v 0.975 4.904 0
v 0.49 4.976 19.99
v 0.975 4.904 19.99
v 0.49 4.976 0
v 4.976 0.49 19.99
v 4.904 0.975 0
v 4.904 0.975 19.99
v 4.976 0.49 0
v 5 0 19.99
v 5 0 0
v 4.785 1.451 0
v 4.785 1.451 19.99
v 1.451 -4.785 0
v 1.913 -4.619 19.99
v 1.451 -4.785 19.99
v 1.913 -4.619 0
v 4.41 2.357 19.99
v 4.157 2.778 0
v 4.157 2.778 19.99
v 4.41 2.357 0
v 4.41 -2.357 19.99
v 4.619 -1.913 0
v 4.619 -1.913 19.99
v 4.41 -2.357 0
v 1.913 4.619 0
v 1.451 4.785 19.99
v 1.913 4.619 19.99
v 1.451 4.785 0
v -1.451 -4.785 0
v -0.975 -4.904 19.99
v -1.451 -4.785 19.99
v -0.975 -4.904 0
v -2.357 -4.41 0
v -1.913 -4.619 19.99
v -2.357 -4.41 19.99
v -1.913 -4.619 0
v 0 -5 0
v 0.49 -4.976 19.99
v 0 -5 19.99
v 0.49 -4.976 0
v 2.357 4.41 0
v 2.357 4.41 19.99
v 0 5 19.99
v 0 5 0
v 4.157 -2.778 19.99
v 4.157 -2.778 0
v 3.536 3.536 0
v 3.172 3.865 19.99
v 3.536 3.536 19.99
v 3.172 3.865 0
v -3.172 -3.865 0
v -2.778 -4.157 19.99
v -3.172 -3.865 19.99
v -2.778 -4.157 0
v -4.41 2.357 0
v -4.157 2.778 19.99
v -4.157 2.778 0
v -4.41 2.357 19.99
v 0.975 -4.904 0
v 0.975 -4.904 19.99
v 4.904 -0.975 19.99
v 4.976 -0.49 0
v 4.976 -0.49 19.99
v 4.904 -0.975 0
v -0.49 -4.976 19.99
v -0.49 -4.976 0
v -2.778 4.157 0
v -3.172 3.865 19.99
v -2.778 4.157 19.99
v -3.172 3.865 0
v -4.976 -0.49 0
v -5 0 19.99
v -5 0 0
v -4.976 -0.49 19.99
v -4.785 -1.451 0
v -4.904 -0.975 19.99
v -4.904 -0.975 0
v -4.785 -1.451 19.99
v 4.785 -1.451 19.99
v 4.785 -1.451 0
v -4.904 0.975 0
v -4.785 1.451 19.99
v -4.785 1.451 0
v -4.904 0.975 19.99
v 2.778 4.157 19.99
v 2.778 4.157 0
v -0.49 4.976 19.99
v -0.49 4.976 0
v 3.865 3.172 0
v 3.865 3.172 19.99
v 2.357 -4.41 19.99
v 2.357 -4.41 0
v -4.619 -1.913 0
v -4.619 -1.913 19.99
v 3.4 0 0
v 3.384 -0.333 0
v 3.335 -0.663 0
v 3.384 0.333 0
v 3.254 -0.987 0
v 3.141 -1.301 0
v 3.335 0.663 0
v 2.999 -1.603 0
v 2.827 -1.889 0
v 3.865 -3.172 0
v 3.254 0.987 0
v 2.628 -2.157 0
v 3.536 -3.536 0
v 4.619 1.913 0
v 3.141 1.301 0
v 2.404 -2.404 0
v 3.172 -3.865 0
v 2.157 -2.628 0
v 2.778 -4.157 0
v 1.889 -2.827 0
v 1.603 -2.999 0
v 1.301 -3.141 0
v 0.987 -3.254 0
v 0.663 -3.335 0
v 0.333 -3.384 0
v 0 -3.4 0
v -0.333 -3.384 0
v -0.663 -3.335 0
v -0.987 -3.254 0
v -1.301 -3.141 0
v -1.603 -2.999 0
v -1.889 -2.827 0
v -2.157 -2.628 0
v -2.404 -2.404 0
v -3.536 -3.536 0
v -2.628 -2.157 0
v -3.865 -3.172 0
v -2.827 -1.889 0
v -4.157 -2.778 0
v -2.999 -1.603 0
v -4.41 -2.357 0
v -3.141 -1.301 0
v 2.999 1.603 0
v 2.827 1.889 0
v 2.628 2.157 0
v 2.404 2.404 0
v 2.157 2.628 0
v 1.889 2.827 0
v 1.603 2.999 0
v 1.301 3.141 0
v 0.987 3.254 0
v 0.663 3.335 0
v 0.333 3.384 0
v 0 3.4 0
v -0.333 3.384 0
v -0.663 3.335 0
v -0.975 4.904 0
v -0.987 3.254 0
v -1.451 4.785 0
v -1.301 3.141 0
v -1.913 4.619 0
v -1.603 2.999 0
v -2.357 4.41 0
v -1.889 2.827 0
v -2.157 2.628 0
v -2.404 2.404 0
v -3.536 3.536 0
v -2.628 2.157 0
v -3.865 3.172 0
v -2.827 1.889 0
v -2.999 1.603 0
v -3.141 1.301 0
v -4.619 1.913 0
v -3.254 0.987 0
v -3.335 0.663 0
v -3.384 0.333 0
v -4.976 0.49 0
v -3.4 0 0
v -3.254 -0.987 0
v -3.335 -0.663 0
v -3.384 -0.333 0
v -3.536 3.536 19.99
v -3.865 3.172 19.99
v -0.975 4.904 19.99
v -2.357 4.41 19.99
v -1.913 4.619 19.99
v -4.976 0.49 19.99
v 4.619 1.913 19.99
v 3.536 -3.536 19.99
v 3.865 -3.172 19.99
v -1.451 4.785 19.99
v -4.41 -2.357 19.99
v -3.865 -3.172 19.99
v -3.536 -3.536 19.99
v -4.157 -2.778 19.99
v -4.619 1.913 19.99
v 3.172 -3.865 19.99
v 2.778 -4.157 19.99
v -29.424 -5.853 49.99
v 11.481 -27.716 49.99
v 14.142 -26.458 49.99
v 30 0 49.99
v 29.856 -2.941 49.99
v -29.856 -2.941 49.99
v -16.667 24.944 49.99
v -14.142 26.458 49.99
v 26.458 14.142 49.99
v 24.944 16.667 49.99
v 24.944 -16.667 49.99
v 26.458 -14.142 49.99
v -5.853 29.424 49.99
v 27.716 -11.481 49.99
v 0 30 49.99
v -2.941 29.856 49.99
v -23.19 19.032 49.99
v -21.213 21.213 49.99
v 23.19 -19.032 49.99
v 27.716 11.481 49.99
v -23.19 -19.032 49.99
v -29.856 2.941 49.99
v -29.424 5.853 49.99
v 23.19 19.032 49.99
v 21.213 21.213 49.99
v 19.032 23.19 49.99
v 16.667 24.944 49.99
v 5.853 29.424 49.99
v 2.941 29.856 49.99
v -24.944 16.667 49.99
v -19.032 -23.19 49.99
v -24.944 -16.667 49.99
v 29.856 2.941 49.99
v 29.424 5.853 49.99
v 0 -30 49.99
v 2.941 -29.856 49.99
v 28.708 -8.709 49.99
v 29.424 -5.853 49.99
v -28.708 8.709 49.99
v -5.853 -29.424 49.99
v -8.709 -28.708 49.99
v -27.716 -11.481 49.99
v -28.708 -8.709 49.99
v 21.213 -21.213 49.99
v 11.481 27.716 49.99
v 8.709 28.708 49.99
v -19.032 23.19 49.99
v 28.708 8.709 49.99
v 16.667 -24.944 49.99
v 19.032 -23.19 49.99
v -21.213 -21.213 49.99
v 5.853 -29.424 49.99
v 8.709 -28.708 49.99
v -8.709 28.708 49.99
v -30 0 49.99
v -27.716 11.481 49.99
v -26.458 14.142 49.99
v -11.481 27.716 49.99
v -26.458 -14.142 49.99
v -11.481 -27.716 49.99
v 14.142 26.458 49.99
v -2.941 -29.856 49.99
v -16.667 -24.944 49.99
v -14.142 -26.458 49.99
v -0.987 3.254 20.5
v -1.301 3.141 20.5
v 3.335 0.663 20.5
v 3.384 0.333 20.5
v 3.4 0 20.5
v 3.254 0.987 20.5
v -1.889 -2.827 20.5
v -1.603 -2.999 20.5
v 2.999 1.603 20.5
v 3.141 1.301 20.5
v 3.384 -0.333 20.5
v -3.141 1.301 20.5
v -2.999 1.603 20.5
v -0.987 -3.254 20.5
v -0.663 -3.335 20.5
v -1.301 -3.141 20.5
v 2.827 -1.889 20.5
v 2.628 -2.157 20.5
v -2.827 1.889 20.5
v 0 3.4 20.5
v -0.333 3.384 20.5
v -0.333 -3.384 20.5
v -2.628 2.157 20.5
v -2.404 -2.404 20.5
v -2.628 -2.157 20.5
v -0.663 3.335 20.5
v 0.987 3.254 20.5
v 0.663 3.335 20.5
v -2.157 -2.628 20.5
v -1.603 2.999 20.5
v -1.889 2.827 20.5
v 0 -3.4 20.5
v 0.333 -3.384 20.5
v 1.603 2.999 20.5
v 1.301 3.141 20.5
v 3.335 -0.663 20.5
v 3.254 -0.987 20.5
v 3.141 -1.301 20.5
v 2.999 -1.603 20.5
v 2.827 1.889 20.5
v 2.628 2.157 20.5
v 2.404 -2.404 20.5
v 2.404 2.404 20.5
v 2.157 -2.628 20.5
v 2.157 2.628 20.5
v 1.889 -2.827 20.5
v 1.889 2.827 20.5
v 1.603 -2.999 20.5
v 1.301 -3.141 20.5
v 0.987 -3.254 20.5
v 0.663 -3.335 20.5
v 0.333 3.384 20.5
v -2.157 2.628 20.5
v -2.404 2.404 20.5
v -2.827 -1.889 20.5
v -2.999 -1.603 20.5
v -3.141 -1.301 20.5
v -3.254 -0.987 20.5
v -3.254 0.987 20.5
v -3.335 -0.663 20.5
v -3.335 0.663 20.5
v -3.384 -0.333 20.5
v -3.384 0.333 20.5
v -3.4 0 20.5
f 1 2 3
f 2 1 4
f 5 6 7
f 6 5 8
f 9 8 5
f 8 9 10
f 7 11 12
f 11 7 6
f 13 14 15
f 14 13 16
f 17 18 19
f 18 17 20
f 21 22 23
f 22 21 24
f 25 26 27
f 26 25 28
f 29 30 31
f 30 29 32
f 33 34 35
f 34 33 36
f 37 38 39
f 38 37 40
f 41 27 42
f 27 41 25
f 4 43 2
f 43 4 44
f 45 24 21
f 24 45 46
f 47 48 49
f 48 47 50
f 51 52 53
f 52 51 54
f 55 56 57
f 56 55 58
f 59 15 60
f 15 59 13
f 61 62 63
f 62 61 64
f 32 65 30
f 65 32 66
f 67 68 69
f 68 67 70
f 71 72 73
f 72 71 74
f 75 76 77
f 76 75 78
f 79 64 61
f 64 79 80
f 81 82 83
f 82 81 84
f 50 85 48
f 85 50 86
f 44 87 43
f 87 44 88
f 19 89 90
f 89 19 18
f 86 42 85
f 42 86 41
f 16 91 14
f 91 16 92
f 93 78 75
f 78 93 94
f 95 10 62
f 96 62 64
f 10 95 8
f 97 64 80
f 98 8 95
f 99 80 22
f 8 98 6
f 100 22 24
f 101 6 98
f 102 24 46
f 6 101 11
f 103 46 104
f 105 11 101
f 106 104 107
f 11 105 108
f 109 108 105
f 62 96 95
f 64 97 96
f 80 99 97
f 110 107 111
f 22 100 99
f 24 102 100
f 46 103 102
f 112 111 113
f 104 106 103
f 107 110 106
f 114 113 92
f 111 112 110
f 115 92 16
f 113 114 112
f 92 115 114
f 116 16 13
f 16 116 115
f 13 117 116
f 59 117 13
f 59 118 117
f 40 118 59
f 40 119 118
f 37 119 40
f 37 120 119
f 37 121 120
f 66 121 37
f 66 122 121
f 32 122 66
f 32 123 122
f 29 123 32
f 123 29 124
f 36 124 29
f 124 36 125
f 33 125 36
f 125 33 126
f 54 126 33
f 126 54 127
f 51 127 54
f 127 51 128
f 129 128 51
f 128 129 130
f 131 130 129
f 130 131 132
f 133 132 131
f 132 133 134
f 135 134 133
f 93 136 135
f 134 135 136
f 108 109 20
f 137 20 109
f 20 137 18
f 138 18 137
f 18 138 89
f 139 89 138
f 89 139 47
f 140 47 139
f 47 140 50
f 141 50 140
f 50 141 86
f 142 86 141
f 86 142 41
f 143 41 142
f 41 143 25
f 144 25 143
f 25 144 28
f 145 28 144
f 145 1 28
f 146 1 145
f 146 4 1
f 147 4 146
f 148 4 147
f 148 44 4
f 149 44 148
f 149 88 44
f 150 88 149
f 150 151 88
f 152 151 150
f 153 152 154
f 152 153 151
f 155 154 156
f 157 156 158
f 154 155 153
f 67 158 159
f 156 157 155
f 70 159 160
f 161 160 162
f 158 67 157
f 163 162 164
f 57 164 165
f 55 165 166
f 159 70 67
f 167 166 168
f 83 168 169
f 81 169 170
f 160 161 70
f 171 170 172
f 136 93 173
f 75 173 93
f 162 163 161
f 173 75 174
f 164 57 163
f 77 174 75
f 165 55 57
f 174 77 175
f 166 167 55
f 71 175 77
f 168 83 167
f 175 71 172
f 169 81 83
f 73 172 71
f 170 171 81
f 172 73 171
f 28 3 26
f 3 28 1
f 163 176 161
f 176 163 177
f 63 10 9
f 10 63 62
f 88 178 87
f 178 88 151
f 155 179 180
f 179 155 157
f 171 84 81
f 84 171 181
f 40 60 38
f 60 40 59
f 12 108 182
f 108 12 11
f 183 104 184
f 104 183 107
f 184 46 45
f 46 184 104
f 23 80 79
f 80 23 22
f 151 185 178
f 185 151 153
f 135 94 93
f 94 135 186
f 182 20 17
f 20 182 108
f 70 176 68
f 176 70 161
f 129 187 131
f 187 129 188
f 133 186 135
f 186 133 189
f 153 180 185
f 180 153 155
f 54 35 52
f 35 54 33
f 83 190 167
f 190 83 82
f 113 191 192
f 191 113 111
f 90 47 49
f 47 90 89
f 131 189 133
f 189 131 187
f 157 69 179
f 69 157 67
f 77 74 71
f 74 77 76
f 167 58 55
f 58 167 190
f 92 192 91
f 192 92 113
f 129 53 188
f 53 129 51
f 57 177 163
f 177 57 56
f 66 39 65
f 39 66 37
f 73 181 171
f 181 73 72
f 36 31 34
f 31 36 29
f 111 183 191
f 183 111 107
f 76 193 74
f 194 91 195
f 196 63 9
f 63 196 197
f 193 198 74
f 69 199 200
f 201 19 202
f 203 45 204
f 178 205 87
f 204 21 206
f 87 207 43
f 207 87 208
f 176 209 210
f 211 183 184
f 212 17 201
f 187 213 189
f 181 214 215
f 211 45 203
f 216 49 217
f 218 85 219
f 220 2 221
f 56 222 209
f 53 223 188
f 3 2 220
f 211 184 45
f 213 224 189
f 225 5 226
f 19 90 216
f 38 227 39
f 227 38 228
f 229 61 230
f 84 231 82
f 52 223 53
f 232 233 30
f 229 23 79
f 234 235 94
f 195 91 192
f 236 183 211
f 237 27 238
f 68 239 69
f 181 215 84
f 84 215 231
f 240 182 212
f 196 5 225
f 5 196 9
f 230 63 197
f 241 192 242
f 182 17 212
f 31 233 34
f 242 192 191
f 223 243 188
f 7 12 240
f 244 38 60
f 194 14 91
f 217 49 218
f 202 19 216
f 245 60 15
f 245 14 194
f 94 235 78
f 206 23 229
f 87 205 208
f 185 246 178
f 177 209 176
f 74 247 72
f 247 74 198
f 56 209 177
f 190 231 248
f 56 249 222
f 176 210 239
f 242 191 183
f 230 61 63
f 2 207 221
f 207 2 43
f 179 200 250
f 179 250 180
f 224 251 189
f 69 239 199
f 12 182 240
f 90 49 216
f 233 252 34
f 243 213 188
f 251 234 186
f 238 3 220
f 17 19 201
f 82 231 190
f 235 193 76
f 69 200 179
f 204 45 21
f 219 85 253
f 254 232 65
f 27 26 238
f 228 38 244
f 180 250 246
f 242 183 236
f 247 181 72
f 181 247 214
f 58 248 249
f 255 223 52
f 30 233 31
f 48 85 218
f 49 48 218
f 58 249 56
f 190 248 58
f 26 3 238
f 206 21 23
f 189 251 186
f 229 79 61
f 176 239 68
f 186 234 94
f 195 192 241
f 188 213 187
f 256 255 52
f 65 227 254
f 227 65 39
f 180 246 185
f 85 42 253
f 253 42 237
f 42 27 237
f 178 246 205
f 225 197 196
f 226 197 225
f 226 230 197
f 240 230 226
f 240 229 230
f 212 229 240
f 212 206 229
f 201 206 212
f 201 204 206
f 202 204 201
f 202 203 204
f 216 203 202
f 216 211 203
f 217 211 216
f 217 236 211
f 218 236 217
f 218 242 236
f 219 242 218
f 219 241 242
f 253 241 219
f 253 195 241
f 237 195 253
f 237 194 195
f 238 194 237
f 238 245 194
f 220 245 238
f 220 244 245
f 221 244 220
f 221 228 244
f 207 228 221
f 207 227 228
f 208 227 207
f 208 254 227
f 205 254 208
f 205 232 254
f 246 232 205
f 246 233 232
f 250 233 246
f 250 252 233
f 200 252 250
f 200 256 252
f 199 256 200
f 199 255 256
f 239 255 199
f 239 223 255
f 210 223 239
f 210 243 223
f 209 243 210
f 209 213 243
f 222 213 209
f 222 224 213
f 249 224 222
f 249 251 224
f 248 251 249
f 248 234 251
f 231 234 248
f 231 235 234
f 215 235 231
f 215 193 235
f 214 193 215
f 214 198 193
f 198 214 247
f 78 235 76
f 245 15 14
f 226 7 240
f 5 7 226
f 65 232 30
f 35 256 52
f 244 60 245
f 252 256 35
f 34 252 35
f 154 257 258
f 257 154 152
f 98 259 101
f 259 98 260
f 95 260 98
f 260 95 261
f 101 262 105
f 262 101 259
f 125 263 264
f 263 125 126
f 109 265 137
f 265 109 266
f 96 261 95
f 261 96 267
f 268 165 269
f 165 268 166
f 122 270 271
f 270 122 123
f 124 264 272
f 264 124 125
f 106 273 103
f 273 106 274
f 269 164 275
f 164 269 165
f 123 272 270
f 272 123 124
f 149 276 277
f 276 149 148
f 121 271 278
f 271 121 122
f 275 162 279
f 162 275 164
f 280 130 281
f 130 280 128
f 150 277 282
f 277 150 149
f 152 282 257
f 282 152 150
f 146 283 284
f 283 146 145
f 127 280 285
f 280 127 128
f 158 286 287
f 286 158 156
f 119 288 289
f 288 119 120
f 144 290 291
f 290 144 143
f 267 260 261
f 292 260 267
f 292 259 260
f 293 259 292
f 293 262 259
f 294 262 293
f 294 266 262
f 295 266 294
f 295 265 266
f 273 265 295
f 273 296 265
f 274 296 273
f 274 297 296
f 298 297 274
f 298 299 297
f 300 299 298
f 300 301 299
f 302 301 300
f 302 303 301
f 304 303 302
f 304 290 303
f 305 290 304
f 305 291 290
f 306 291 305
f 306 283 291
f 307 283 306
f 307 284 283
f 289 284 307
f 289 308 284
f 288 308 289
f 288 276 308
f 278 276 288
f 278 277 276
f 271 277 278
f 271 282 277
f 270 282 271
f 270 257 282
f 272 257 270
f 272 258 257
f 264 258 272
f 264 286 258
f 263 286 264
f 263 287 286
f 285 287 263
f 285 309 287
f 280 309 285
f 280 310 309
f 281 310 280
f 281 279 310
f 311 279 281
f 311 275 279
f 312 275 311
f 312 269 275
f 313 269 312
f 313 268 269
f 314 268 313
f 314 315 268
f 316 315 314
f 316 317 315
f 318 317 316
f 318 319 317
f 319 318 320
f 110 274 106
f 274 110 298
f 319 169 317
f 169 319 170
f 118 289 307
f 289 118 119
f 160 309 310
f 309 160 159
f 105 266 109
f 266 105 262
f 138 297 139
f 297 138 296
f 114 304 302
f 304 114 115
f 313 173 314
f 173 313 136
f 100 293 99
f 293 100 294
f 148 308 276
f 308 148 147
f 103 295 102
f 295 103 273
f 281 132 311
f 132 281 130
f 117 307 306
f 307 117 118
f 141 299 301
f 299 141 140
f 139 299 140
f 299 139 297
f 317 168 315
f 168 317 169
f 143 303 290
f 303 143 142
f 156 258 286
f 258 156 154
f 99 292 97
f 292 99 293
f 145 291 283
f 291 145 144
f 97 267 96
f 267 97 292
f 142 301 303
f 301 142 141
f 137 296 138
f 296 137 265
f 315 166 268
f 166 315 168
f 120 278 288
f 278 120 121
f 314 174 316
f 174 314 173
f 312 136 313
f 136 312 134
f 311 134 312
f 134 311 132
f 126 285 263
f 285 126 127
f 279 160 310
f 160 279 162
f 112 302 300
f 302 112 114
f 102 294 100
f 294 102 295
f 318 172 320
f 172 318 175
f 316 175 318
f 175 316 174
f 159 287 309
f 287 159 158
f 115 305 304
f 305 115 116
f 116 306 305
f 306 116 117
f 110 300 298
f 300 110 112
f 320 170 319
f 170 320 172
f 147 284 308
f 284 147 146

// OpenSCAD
// Lab funnel - printed upright, wide opening at the top
// Units: mm. Wall thickness 1.6 mm throughout.

$fn = 64;

// ---- Dimensions ----
spout_od      = 10;    // outer diameter of straight spout
spout_id      = spout_od - 2 * 1.6;  // spout bore (6.8 mm)
spout_h       = 20;    // spout length, z = 0 .. 20

cone_bottom_d = spout_od;               // cone starts at spout diameter
cone_top_d    = 60;                     // cone rim diameter
cone_h        = 50 - 20;                // cone height (30 mm)

eps = 0.5;             // cutter overshoot past faces

// ---- Model ----
difference() {
    union() {
        // Straight spout
        cylinder(h = spout_h, d = spout_od);

        // Cone, overlapping slightly into the spout for a clean union
        translate([0, 0, spout_h - 0.01])
            cylinder(h = cone_h, d1 = cone_bottom_d, d2 = cone_top_d);
    }

    // Bottom exit hole through the spout
    translate([0, 0, -eps])
        cylinder(h = spout_h + 2 * eps, d = spout_id);
}
